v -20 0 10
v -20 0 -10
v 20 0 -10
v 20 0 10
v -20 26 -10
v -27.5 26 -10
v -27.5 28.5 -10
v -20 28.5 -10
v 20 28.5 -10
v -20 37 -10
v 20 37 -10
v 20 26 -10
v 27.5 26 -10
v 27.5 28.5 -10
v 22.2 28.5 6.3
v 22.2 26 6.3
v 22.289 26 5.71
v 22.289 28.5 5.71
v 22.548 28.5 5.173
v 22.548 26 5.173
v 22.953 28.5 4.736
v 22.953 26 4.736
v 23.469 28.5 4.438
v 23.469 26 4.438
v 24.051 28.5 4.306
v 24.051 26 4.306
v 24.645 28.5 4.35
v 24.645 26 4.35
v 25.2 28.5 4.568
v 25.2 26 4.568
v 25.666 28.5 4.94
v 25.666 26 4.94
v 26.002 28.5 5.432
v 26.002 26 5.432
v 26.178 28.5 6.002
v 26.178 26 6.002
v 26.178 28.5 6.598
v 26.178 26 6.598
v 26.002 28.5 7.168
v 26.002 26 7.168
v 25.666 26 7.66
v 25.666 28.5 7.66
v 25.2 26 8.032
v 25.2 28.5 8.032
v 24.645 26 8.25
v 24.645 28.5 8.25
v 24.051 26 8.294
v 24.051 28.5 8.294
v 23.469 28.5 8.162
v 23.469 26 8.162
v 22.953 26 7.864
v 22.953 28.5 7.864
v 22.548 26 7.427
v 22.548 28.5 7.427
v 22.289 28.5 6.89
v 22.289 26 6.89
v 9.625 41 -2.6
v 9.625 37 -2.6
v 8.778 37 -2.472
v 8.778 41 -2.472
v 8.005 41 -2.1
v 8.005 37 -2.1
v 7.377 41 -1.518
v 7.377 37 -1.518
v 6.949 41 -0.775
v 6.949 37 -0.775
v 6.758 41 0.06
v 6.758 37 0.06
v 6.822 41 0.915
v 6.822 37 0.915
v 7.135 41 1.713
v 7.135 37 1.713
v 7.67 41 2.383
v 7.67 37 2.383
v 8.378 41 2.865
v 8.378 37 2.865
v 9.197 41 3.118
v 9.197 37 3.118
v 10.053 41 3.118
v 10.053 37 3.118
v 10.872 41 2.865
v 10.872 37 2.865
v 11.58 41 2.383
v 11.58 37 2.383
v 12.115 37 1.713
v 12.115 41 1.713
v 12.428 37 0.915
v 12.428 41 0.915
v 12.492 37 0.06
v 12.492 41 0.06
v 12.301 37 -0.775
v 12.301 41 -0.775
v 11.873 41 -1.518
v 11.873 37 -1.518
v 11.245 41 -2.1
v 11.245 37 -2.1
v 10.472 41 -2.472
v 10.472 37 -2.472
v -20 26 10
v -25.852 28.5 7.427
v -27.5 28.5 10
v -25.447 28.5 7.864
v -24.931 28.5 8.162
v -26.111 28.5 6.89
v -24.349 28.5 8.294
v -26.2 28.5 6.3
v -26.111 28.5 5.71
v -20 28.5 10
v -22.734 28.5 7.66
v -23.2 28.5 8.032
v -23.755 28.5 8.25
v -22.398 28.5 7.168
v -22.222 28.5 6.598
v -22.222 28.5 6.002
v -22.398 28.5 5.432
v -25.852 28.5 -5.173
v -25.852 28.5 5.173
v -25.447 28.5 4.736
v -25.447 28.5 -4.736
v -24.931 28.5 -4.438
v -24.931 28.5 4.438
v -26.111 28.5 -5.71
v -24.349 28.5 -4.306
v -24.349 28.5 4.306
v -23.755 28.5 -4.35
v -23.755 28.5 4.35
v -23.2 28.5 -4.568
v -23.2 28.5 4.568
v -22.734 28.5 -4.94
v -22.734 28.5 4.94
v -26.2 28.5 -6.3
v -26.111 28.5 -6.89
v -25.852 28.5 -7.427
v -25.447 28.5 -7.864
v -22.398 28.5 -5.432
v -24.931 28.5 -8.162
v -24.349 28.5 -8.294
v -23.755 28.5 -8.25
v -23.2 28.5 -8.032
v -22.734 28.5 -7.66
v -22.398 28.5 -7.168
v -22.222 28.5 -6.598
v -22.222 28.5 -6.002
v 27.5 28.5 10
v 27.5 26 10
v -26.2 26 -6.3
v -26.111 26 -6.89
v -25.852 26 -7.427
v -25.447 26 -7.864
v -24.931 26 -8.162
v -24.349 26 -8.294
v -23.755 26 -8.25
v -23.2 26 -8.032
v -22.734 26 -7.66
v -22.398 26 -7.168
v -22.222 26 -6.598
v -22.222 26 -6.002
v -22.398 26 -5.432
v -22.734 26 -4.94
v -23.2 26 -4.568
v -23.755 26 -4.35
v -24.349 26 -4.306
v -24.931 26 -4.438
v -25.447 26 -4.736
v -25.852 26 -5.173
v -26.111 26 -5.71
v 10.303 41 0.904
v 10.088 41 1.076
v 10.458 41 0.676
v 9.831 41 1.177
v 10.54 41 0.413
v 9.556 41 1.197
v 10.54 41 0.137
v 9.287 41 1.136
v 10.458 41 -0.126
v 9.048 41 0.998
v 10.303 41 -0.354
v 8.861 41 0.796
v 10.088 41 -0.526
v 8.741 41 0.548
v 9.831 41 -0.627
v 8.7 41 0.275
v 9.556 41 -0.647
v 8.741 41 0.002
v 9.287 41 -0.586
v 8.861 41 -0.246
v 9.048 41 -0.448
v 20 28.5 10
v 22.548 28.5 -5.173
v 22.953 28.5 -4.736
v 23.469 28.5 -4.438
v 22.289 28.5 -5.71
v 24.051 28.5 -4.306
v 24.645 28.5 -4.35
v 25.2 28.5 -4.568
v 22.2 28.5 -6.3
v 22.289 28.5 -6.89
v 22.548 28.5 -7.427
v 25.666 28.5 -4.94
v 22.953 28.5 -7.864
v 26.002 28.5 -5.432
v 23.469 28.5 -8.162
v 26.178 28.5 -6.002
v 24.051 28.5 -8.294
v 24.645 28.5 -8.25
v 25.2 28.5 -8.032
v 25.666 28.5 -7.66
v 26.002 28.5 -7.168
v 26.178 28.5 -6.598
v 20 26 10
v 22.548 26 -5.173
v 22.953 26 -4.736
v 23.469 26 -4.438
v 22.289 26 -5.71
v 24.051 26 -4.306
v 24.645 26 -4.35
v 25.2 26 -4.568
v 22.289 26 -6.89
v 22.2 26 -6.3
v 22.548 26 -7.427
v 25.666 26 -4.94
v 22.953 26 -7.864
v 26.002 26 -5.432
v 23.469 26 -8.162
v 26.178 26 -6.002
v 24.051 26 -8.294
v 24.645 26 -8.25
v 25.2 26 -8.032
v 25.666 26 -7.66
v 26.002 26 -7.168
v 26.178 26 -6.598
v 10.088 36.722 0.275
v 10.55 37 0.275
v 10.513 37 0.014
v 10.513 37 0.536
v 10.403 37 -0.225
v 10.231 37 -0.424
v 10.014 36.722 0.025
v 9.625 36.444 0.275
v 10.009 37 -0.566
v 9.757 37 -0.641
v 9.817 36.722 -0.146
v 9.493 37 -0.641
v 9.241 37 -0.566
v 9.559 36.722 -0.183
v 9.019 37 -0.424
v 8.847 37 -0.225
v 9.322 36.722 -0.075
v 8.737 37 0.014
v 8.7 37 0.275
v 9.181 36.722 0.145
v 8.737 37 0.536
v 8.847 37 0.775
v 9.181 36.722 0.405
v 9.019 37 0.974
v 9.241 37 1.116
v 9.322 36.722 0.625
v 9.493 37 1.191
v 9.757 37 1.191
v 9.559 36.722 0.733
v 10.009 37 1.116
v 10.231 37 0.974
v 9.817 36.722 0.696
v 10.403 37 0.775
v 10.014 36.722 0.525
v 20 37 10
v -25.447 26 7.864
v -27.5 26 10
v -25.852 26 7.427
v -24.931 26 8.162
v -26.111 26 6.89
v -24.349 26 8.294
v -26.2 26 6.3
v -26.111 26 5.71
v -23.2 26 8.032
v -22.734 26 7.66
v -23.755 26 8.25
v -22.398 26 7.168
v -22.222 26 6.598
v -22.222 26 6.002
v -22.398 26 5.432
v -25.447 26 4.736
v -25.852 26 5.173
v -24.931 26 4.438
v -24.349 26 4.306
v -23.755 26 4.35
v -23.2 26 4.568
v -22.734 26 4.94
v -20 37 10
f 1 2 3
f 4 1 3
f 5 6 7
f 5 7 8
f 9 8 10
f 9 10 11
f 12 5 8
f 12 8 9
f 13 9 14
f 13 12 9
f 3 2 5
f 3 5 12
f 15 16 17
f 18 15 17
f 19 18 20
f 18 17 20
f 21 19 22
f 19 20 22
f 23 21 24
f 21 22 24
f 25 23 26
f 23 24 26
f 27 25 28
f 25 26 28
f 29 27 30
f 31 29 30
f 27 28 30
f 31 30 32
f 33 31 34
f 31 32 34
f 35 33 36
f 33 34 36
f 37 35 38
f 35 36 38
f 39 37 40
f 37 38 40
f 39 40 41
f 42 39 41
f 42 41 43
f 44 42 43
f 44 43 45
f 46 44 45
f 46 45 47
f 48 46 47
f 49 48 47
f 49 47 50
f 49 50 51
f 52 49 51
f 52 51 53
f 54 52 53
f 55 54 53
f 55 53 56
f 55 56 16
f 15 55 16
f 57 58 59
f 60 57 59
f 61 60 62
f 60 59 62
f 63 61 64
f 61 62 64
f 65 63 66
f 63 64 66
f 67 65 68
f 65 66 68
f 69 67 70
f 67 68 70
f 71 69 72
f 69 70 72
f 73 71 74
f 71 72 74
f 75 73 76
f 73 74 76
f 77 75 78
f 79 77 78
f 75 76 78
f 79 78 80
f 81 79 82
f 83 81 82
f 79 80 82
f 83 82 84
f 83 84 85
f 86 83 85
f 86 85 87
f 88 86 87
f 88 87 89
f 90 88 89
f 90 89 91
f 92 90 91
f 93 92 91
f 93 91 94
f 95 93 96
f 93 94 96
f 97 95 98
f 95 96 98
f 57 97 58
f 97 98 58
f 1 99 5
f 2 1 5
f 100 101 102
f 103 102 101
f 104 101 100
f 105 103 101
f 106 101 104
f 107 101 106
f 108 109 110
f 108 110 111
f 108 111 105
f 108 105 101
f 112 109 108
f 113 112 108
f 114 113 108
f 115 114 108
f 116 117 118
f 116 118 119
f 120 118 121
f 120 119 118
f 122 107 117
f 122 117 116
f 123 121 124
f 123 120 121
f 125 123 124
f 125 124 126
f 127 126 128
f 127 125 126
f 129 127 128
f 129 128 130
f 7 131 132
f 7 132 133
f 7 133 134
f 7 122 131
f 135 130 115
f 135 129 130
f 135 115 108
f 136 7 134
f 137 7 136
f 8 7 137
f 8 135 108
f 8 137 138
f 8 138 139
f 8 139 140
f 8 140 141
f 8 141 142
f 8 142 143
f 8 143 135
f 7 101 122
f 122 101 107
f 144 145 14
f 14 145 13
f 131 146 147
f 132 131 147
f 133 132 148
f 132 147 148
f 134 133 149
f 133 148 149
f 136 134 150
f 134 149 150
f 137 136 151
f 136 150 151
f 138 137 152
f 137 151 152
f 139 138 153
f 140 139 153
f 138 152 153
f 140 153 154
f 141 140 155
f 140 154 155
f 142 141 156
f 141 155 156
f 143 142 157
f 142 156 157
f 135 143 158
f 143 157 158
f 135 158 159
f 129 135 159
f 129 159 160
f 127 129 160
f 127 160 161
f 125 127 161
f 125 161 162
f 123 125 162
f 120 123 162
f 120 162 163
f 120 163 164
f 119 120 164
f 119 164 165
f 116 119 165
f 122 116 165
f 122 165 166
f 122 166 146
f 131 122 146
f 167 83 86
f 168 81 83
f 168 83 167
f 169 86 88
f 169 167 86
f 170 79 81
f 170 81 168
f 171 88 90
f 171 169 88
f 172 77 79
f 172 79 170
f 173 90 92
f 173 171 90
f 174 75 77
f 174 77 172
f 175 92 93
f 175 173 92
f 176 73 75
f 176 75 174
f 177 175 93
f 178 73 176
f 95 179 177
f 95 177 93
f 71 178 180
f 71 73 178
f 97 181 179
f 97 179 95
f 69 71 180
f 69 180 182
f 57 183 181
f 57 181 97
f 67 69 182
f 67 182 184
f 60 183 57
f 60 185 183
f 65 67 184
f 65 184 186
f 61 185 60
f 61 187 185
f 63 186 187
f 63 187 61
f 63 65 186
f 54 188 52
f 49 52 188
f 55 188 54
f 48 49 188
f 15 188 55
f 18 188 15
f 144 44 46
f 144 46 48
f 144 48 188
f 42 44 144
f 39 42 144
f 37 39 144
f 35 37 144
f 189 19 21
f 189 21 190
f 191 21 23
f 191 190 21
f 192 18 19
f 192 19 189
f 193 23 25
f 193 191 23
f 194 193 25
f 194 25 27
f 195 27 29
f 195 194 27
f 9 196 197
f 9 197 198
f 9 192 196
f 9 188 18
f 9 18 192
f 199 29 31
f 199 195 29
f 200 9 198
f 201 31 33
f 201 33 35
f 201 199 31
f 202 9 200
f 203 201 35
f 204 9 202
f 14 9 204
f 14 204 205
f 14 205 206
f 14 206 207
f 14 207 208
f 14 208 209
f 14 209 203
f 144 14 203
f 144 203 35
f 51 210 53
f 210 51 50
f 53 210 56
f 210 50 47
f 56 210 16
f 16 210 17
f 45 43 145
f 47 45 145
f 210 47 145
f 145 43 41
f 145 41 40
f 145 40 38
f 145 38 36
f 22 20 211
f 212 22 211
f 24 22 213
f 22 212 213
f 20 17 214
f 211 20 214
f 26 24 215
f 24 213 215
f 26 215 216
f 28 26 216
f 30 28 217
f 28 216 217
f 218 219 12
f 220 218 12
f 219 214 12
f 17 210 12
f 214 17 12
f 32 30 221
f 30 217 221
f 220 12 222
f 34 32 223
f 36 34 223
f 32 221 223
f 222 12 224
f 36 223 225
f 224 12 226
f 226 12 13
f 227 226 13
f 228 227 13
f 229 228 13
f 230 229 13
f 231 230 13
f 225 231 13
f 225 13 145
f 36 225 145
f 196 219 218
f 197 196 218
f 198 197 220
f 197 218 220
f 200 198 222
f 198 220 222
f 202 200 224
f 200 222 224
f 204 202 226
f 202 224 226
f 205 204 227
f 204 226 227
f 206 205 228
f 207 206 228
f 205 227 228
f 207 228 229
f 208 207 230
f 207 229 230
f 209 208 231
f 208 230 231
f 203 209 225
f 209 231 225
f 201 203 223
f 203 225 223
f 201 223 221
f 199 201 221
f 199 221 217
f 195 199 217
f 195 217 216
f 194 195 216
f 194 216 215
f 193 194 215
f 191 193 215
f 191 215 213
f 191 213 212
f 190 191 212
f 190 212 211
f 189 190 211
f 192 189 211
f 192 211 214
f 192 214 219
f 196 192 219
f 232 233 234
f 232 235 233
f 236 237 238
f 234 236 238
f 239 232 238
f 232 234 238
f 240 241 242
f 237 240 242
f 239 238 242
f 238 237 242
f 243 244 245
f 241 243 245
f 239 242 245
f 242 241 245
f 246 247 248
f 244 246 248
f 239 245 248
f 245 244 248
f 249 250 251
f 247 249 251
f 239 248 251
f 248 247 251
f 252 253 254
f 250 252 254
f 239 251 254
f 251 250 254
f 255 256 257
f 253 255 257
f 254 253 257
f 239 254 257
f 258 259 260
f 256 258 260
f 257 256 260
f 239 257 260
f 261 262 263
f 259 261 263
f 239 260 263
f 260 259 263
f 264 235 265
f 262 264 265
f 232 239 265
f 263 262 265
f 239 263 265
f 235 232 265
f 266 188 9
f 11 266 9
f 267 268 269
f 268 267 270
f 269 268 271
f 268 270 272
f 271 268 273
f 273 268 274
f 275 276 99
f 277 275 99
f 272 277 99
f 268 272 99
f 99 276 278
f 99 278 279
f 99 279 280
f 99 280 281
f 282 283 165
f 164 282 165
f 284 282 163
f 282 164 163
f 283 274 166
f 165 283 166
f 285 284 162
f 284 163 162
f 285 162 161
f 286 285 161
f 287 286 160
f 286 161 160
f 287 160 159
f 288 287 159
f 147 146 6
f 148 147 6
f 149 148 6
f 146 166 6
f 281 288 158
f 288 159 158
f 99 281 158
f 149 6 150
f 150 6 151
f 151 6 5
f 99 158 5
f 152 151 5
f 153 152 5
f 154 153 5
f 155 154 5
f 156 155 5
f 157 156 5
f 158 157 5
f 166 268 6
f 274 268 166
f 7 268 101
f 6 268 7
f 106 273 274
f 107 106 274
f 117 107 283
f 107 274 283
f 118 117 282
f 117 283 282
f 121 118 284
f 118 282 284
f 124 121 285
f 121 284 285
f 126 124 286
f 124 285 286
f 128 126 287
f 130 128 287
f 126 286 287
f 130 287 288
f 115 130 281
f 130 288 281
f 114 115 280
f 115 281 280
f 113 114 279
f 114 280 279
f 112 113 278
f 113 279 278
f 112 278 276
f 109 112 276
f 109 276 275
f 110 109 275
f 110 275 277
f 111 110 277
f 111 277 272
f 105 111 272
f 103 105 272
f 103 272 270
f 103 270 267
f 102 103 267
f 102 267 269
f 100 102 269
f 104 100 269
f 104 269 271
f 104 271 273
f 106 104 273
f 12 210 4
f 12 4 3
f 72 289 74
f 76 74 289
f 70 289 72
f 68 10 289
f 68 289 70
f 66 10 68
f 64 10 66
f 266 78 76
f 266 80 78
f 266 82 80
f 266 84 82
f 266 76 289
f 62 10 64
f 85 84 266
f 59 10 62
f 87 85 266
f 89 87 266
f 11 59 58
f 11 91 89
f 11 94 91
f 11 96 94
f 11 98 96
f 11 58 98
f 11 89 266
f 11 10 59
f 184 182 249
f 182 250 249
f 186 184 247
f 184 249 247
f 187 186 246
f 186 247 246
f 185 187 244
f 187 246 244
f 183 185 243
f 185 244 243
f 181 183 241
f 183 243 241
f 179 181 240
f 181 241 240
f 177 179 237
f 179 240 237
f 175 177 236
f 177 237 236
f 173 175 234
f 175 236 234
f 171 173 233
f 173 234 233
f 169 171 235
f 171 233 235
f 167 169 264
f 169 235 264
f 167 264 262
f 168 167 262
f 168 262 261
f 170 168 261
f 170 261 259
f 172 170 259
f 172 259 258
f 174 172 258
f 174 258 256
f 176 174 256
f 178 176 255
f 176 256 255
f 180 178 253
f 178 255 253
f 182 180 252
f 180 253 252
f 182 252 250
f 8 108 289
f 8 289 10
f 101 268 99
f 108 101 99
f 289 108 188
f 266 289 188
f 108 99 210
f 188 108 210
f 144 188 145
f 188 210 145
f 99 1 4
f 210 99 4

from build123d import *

# Parameters (mm, degrees)
SKETCH1_W                        = 40
SKETCH1_H                        = 20
BOSS_EXTRUDE1_DEPTH              = 37
SKETCH2_W                        = 7.5
SKETCH2_H                        = 20
BOSS_EXTRUDE2_DEPTH              = 2.5
F_4_0_4_DIAMETER_HOLE1_D         = 4
SKETCH5_R                        = 2.875
BOSS_EXTRUDE3_DEPTH              = 4
F_1_85_1_85_DIAMETER_HOLE1_D     = 1.85
F_1_85_1_85_DIAMETER_HOLE1_DEPTH = 4
F_1_85_1_85_DIAMETER_HOLE1_TIP   = 0.555796073


with BuildPart() as part:
    # Sketch1 → Boss-Extrude1 (new body)
    with BuildSketch(Plane(origin=(0, 0, 0), x_dir=(1, 0, 0), z_dir=(0, 1, 0))):
        Rectangle(SKETCH1_W, SKETCH1_H)
    extrude(amount=BOSS_EXTRUDE1_DEPTH)

    # Sketch2 → Boss-Extrude2 (add)
    with BuildSketch(Plane(origin=(0, 26, 0), x_dir=(1, 0, 0), z_dir=(0, 1, 0))):
        with Locations((23.75, 0)):
            Rectangle(SKETCH2_W, SKETCH2_H)
        with Locations((-23.75, 0)):
            Rectangle(SKETCH2_W, SKETCH2_H)
    extrude(amount=BOSS_EXTRUDE2_DEPTH)

    # Ø4.0 (4) Diameter Hole1 (through all)
    with Locations(Plane(origin=(0, 28.5, 0), x_dir=(1, 0, 0), z_dir=(0, 1, 0))):
        with Locations((-24.2, -6.3), (-24.2, 6.3), (24.2, 6.3), (24.2, -6.3)):
            Hole(F_4_0_4_DIAMETER_HOLE1_D / 2)

    # Sketch5 → Boss-Extrude3 (add)
    with BuildSketch(Plane(origin=(0, 37, 0), x_dir=(1, 0, 0), z_dir=(0, 1, 0))):
        with Locations(Location((9.625, -0.275, 0), (0, 0, 90))):
            Circle(SKETCH5_R)
    extrude(amount=BOSS_EXTRUDE3_DEPTH)

    # Ø1.85 (1.85) Diameter Hole1
    with Locations(Plane(origin=(0, 41, 0), x_dir=(1, 0, 0), z_dir=(0, 1, 0))):
        with Locations((9.625, -0.275)):
            Hole(F_1_85_1_85_DIAMETER_HOLE1_D / 2, depth=F_1_85_1_85_DIAMETER_HOLE1_DEPTH)
            with Locations((0, 0, -(F_1_85_1_85_DIAMETER_HOLE1_DEPTH + F_1_85_1_85_DIAMETER_HOLE1_TIP / 2))):  # 118° drill point
                Cone(0, F_1_85_1_85_DIAMETER_HOLE1_D / 2, F_1_85_1_85_DIAMETER_HOLE1_TIP, mode=Mode.SUBTRACT)


solid = part.part
